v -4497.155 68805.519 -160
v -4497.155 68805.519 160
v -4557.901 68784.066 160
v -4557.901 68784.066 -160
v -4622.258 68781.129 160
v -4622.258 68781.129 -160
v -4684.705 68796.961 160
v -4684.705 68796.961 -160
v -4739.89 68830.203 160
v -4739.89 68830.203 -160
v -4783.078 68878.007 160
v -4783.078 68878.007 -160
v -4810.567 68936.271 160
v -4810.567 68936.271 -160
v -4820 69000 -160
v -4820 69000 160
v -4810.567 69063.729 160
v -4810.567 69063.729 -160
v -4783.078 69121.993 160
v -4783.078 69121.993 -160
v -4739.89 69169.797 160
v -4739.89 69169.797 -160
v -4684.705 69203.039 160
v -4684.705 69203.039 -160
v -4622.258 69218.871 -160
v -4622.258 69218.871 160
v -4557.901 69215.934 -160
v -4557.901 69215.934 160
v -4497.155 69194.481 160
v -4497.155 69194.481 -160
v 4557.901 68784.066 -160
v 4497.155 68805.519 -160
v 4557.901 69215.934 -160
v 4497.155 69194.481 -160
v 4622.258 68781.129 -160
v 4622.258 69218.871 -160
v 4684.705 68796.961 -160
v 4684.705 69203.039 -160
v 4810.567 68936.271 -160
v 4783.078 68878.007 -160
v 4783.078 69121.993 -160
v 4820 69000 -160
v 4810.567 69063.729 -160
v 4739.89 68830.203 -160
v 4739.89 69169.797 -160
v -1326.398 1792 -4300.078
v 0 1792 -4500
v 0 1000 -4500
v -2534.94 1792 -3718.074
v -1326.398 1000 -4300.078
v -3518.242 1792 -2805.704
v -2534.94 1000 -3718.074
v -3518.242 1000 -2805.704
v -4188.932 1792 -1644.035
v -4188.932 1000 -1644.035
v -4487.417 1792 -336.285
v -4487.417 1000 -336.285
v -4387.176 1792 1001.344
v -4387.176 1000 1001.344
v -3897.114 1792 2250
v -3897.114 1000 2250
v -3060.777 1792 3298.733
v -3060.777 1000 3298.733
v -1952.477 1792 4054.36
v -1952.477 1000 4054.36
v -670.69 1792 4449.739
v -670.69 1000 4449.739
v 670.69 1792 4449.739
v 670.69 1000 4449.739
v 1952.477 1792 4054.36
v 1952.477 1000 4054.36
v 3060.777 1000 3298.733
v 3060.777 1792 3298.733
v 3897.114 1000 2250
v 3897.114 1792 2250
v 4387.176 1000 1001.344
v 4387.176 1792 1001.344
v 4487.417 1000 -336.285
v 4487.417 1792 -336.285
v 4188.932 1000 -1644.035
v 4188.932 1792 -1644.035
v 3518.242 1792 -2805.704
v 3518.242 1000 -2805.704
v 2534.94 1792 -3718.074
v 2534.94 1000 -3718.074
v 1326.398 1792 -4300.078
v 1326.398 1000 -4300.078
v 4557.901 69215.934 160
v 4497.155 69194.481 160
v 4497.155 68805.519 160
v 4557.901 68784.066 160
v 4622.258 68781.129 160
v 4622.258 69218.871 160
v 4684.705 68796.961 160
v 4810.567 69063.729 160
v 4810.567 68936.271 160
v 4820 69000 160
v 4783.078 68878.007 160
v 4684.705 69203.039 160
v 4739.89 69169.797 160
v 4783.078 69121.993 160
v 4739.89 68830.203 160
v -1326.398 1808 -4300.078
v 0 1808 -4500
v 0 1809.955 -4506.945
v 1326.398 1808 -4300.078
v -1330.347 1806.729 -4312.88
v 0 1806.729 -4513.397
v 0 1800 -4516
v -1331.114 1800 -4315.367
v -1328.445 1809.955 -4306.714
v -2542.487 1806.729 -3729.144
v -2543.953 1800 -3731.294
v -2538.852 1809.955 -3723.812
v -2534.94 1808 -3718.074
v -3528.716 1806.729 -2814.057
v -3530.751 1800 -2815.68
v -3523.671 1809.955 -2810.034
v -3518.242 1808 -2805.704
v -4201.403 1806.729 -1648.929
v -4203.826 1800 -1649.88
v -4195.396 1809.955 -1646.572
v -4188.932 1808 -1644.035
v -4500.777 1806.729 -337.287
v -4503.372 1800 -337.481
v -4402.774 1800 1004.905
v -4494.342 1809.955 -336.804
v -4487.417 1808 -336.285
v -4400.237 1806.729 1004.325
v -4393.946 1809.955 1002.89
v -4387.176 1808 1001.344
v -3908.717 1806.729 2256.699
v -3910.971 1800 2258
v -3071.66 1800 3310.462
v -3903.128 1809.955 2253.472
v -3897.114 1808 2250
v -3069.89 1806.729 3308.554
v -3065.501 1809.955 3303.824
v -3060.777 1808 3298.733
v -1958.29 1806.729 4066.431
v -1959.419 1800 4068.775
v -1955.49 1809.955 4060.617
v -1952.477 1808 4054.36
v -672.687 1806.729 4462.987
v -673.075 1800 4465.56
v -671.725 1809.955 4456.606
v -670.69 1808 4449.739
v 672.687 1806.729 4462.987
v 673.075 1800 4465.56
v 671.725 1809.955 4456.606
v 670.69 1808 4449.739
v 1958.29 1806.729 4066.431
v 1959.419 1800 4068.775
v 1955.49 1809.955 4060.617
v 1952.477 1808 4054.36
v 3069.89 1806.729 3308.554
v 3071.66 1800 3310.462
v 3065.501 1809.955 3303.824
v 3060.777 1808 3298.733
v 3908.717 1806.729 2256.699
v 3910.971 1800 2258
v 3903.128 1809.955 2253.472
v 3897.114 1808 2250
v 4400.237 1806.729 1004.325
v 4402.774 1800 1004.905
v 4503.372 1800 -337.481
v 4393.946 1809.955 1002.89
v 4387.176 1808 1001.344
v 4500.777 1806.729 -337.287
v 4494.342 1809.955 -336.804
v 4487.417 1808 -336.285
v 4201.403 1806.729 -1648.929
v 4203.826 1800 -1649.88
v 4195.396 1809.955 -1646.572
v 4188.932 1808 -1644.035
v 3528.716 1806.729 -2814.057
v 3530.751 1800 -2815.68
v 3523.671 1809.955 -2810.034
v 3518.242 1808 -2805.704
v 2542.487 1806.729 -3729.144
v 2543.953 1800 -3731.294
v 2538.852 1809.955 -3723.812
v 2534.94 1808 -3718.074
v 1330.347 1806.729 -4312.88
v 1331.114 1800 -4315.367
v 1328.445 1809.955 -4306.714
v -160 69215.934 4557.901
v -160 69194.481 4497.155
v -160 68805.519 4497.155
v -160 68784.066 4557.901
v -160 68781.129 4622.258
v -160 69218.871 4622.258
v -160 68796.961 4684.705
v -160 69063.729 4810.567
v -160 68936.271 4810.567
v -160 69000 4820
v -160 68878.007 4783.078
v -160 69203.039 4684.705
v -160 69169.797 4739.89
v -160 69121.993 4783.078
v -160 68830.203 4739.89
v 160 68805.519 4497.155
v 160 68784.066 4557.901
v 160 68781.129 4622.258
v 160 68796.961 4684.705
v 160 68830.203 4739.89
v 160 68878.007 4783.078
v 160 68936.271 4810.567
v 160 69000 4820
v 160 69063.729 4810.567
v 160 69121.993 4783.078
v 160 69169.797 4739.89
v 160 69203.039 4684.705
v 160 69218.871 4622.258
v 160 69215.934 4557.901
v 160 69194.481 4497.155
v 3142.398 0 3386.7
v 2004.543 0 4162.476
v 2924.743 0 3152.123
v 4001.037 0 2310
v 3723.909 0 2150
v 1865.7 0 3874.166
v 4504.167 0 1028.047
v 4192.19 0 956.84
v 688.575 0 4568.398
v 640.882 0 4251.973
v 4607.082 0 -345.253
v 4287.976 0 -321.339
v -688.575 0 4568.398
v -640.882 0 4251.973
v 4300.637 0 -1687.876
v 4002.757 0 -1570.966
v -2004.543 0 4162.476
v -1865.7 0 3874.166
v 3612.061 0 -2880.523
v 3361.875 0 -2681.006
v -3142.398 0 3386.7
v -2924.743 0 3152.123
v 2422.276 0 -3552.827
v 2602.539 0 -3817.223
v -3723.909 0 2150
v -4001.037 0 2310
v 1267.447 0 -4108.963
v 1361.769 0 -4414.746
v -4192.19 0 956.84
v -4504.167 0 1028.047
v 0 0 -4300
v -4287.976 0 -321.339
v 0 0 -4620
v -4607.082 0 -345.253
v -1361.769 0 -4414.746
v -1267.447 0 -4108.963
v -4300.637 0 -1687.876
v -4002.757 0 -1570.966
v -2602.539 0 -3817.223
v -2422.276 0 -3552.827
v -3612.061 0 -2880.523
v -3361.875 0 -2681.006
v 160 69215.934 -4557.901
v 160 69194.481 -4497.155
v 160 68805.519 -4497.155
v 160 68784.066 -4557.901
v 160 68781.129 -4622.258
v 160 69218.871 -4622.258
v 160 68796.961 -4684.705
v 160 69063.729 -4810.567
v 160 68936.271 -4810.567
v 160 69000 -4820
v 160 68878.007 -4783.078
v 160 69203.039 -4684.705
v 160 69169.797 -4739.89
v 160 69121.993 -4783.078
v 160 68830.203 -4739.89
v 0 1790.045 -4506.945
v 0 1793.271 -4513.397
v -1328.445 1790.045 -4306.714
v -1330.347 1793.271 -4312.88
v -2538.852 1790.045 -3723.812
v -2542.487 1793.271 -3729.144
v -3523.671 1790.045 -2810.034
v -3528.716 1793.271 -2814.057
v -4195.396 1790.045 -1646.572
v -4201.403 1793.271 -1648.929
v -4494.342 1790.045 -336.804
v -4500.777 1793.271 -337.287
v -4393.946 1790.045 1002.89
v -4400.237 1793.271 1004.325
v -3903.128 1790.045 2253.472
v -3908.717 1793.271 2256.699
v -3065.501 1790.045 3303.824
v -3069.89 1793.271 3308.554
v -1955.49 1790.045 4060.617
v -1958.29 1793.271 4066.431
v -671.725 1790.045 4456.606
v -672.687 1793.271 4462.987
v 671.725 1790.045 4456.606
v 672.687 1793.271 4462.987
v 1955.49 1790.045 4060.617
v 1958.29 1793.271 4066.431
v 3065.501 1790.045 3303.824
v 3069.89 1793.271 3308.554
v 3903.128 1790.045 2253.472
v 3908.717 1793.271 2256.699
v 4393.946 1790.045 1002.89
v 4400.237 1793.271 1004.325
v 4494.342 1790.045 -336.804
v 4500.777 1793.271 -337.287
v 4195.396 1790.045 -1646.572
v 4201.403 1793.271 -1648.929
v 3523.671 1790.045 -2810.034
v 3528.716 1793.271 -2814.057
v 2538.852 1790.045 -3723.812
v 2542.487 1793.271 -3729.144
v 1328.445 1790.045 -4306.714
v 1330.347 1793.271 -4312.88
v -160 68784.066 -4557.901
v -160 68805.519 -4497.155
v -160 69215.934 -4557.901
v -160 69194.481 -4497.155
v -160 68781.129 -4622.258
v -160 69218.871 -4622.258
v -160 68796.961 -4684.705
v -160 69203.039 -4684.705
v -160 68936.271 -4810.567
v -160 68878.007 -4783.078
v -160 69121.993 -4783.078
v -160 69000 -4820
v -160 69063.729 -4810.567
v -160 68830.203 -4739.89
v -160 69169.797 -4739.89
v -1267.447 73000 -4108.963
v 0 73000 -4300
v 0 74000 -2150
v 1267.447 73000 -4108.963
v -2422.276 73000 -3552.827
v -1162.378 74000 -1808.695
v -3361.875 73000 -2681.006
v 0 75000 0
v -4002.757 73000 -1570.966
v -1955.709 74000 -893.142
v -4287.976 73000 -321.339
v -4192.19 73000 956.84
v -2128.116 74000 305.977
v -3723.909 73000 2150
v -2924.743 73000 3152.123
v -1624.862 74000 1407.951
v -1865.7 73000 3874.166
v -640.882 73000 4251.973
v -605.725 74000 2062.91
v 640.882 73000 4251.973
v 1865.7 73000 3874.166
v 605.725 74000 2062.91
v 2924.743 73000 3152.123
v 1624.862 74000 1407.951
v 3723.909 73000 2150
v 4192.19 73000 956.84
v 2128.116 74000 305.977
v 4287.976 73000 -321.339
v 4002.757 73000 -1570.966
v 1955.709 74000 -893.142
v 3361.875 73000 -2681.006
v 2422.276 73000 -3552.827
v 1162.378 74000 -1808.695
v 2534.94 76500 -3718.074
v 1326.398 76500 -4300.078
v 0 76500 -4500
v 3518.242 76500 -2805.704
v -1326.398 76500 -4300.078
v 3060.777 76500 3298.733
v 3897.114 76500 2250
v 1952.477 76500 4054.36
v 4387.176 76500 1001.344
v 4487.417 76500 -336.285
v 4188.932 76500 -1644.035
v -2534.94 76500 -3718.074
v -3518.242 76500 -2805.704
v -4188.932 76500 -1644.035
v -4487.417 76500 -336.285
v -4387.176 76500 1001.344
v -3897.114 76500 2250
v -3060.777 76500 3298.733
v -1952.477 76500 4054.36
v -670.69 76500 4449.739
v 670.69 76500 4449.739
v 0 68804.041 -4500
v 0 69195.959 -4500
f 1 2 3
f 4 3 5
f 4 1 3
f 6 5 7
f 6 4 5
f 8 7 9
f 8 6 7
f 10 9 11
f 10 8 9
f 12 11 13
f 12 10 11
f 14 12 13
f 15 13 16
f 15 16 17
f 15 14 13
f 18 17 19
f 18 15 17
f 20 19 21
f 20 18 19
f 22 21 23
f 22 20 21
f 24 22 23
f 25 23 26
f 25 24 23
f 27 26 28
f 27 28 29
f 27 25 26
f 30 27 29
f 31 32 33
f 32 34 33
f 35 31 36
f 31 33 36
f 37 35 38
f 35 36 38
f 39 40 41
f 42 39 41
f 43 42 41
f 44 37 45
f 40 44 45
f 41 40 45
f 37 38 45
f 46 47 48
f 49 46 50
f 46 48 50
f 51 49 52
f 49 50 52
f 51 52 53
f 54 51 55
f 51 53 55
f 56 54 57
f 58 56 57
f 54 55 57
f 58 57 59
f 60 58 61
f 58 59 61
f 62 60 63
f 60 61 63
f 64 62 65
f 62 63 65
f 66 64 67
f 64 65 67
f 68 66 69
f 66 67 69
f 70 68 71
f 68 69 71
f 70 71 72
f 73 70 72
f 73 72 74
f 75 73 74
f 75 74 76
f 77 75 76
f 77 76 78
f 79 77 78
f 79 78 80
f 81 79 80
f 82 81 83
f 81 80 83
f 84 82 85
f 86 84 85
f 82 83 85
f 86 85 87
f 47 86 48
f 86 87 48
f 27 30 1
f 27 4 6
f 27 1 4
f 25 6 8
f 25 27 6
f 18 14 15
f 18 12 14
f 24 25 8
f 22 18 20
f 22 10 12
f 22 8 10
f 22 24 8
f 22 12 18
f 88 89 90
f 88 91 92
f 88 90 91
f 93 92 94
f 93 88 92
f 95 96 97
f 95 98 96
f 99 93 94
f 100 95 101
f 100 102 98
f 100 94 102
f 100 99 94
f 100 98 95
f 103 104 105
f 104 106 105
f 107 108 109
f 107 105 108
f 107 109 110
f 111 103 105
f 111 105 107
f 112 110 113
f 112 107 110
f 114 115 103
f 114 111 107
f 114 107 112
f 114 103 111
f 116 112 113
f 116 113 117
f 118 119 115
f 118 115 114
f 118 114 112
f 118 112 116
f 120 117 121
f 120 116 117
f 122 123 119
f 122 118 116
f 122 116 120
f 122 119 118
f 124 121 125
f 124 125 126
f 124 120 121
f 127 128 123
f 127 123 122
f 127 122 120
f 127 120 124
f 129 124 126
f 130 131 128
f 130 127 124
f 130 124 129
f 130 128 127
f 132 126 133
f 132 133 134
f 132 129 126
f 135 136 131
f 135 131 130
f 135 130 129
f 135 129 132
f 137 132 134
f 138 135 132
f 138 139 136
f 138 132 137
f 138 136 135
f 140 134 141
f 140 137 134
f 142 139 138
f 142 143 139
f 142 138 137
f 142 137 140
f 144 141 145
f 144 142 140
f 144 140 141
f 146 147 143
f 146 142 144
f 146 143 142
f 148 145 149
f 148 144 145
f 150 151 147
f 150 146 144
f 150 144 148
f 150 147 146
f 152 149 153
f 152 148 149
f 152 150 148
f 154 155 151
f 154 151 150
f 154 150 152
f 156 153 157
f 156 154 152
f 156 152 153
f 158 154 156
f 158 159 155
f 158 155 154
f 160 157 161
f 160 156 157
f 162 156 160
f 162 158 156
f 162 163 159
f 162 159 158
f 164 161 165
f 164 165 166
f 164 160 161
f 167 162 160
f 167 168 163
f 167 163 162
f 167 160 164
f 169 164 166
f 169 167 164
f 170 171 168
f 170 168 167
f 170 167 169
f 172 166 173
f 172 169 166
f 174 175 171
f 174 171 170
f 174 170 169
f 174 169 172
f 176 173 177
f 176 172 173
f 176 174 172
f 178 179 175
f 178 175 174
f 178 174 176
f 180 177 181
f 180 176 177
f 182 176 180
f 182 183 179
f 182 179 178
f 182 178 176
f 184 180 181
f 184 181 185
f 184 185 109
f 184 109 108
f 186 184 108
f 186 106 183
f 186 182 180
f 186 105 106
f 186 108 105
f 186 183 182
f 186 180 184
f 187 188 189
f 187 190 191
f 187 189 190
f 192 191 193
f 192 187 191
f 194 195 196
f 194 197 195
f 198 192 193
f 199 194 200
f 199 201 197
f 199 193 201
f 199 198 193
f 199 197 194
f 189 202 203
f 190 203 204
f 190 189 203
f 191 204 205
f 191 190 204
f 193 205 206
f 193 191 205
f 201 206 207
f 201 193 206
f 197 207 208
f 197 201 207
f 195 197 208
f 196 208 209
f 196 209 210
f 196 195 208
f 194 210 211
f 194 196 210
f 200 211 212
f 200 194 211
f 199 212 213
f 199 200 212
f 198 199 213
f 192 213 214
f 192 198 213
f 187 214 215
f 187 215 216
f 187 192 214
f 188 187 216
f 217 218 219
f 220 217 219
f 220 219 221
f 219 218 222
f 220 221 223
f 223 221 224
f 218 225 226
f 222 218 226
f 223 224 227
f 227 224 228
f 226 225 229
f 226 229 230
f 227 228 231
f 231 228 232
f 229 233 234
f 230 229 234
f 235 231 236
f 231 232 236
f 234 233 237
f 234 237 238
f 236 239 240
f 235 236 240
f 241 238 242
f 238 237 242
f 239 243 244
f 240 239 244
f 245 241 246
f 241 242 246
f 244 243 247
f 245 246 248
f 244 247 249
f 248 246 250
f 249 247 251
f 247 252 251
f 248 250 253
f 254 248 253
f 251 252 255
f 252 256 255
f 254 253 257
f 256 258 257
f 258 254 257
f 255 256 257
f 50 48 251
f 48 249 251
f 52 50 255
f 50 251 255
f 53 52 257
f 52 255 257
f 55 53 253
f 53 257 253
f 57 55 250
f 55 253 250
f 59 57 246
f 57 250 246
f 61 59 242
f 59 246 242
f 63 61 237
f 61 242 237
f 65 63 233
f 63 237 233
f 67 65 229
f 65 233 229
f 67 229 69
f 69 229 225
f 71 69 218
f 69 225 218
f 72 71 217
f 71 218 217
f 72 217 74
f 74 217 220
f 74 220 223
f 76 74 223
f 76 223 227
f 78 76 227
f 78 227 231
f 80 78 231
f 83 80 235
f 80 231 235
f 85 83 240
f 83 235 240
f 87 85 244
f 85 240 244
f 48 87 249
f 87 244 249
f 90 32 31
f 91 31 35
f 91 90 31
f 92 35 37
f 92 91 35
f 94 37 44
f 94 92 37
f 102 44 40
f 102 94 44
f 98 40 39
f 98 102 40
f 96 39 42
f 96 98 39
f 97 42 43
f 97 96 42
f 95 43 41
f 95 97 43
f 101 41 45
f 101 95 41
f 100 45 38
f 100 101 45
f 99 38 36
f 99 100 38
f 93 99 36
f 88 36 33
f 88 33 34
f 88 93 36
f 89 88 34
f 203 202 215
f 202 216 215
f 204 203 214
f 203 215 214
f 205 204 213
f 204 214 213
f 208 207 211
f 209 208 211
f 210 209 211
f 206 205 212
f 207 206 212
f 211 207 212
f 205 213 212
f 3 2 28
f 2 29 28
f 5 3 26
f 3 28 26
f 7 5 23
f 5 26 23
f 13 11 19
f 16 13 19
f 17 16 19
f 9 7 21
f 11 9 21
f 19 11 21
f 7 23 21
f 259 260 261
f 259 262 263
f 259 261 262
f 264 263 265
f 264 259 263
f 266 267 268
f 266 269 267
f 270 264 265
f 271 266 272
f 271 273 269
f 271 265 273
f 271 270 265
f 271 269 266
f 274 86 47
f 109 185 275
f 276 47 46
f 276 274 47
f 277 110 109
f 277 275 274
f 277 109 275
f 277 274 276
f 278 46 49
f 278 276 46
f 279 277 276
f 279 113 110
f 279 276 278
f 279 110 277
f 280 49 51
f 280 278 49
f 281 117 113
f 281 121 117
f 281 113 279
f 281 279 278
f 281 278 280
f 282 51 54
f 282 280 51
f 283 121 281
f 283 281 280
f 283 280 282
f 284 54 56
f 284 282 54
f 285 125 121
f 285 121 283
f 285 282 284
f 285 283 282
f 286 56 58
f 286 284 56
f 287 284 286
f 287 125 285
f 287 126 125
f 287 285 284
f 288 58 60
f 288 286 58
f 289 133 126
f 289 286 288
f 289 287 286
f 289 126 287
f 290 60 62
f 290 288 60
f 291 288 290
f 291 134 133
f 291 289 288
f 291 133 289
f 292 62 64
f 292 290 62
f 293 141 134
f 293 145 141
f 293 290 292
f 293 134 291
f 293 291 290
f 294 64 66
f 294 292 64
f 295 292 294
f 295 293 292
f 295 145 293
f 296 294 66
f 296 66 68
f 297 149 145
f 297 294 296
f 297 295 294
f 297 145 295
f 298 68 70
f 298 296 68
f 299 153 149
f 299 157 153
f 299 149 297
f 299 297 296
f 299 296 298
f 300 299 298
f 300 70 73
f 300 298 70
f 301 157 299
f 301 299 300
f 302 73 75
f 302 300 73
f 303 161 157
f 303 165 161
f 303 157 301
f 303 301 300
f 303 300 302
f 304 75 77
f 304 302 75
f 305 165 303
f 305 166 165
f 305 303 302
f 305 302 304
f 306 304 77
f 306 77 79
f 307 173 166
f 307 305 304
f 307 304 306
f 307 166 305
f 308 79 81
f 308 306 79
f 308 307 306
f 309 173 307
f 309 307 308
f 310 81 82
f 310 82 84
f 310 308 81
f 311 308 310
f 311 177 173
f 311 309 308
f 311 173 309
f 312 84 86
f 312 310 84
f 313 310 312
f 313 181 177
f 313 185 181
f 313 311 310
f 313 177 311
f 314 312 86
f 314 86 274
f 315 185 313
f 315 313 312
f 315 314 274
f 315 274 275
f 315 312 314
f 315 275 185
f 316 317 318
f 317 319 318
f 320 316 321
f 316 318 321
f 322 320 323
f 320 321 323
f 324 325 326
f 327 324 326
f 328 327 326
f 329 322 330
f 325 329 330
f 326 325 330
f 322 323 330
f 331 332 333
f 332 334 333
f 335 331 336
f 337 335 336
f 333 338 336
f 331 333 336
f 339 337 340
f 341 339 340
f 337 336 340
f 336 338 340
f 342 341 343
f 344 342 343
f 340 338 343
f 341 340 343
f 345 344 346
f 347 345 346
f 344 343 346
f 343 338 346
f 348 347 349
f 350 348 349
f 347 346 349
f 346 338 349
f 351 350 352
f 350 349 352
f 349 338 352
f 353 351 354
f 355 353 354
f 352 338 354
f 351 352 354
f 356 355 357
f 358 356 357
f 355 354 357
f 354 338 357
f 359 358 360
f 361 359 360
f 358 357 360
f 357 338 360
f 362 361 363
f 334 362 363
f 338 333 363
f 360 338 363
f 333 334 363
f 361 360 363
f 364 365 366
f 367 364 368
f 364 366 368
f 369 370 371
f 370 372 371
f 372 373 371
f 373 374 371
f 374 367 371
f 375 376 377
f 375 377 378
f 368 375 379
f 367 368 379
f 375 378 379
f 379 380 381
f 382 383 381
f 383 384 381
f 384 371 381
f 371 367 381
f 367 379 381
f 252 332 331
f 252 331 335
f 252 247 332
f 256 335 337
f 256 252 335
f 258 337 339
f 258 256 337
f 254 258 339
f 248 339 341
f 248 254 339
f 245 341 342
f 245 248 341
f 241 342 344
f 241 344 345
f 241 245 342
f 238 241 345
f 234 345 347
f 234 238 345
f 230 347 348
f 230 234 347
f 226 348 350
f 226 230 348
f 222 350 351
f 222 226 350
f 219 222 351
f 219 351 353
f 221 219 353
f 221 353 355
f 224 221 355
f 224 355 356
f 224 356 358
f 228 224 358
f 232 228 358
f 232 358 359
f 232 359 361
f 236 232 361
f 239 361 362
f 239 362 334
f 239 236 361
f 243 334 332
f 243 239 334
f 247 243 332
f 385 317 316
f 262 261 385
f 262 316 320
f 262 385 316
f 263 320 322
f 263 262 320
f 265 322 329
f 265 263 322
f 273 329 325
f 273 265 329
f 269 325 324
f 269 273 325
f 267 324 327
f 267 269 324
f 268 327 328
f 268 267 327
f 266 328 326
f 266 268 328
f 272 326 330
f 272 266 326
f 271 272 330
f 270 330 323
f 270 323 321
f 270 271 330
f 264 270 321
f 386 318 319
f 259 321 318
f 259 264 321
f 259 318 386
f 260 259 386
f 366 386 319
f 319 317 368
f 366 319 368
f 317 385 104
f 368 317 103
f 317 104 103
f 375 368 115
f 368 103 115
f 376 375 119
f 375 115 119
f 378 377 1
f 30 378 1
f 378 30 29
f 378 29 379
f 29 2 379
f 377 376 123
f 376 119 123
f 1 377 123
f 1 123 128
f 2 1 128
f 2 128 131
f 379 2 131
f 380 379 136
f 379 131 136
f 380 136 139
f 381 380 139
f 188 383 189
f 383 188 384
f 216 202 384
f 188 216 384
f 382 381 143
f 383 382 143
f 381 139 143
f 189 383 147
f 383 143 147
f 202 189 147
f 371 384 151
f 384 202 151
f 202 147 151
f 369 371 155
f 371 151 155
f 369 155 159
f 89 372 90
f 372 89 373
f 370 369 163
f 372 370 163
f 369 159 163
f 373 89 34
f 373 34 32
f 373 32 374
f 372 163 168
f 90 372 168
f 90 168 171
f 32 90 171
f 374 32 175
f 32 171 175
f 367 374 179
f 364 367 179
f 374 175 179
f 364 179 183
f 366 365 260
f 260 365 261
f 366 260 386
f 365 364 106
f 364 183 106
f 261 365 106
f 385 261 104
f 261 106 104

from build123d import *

# Parameters (mm, degrees)
SKETCH2_R           = 10
SKETCH6_R           = 220
BOSS_EXTRUDE1_DEPTH = 160
CIRPATTERN1_COUNT   = 4


with BuildPart() as part:
    # Sketch1 → Revolve1 (revolve)
    with BuildSketch(Plane.XY, mode=Mode.PRIVATE) as revolve1_sk:
        Polygon((0, 76500), (4500, 76500), (4500, 1000), (4620, 0), (4300, 0), (4300, 1500), (4300, 73000), (0, 75000), align=None)
    revolve(revolve1_sk.sketch.rotate(Axis((0, 0, 0), (0, 1, 0)), 90), axis=Axis((0, 0, 0), (0, 1, 0)))

    # Sketch2 → Revolve2 (revolve)
    with BuildSketch(Plane.XY, mode=Mode.PRIVATE) as revolve2_sk:
        with Locations((4506, 1800)):
            Circle(SKETCH2_R)
    revolve(revolve2_sk.sketch.rotate(Axis((0, 0, 0), (0, 1, 0)), 90), axis=Axis((0, 0, 0), (0, 1, 0)))

    # Sketch6 → Boss-Extrude1 (add, symmetric)
    with BuildSketch(Plane.XY):
        with Locations((4600, 69000)):
            Circle(SKETCH6_R)
    boss_extrude1 = extrude(amount=BOSS_EXTRUDE1_DEPTH, both=True)

    # CirPattern1: Boss-Extrude1 ×4 about axis
    cirpattern1_axis = Axis((0, 0, 0), (0, 1, 0))
    for i in range(1, CIRPATTERN1_COUNT):
        add(boss_extrude1.rotate(cirpattern1_axis, i * 360 / CIRPATTERN1_COUNT))


solid = part.part
